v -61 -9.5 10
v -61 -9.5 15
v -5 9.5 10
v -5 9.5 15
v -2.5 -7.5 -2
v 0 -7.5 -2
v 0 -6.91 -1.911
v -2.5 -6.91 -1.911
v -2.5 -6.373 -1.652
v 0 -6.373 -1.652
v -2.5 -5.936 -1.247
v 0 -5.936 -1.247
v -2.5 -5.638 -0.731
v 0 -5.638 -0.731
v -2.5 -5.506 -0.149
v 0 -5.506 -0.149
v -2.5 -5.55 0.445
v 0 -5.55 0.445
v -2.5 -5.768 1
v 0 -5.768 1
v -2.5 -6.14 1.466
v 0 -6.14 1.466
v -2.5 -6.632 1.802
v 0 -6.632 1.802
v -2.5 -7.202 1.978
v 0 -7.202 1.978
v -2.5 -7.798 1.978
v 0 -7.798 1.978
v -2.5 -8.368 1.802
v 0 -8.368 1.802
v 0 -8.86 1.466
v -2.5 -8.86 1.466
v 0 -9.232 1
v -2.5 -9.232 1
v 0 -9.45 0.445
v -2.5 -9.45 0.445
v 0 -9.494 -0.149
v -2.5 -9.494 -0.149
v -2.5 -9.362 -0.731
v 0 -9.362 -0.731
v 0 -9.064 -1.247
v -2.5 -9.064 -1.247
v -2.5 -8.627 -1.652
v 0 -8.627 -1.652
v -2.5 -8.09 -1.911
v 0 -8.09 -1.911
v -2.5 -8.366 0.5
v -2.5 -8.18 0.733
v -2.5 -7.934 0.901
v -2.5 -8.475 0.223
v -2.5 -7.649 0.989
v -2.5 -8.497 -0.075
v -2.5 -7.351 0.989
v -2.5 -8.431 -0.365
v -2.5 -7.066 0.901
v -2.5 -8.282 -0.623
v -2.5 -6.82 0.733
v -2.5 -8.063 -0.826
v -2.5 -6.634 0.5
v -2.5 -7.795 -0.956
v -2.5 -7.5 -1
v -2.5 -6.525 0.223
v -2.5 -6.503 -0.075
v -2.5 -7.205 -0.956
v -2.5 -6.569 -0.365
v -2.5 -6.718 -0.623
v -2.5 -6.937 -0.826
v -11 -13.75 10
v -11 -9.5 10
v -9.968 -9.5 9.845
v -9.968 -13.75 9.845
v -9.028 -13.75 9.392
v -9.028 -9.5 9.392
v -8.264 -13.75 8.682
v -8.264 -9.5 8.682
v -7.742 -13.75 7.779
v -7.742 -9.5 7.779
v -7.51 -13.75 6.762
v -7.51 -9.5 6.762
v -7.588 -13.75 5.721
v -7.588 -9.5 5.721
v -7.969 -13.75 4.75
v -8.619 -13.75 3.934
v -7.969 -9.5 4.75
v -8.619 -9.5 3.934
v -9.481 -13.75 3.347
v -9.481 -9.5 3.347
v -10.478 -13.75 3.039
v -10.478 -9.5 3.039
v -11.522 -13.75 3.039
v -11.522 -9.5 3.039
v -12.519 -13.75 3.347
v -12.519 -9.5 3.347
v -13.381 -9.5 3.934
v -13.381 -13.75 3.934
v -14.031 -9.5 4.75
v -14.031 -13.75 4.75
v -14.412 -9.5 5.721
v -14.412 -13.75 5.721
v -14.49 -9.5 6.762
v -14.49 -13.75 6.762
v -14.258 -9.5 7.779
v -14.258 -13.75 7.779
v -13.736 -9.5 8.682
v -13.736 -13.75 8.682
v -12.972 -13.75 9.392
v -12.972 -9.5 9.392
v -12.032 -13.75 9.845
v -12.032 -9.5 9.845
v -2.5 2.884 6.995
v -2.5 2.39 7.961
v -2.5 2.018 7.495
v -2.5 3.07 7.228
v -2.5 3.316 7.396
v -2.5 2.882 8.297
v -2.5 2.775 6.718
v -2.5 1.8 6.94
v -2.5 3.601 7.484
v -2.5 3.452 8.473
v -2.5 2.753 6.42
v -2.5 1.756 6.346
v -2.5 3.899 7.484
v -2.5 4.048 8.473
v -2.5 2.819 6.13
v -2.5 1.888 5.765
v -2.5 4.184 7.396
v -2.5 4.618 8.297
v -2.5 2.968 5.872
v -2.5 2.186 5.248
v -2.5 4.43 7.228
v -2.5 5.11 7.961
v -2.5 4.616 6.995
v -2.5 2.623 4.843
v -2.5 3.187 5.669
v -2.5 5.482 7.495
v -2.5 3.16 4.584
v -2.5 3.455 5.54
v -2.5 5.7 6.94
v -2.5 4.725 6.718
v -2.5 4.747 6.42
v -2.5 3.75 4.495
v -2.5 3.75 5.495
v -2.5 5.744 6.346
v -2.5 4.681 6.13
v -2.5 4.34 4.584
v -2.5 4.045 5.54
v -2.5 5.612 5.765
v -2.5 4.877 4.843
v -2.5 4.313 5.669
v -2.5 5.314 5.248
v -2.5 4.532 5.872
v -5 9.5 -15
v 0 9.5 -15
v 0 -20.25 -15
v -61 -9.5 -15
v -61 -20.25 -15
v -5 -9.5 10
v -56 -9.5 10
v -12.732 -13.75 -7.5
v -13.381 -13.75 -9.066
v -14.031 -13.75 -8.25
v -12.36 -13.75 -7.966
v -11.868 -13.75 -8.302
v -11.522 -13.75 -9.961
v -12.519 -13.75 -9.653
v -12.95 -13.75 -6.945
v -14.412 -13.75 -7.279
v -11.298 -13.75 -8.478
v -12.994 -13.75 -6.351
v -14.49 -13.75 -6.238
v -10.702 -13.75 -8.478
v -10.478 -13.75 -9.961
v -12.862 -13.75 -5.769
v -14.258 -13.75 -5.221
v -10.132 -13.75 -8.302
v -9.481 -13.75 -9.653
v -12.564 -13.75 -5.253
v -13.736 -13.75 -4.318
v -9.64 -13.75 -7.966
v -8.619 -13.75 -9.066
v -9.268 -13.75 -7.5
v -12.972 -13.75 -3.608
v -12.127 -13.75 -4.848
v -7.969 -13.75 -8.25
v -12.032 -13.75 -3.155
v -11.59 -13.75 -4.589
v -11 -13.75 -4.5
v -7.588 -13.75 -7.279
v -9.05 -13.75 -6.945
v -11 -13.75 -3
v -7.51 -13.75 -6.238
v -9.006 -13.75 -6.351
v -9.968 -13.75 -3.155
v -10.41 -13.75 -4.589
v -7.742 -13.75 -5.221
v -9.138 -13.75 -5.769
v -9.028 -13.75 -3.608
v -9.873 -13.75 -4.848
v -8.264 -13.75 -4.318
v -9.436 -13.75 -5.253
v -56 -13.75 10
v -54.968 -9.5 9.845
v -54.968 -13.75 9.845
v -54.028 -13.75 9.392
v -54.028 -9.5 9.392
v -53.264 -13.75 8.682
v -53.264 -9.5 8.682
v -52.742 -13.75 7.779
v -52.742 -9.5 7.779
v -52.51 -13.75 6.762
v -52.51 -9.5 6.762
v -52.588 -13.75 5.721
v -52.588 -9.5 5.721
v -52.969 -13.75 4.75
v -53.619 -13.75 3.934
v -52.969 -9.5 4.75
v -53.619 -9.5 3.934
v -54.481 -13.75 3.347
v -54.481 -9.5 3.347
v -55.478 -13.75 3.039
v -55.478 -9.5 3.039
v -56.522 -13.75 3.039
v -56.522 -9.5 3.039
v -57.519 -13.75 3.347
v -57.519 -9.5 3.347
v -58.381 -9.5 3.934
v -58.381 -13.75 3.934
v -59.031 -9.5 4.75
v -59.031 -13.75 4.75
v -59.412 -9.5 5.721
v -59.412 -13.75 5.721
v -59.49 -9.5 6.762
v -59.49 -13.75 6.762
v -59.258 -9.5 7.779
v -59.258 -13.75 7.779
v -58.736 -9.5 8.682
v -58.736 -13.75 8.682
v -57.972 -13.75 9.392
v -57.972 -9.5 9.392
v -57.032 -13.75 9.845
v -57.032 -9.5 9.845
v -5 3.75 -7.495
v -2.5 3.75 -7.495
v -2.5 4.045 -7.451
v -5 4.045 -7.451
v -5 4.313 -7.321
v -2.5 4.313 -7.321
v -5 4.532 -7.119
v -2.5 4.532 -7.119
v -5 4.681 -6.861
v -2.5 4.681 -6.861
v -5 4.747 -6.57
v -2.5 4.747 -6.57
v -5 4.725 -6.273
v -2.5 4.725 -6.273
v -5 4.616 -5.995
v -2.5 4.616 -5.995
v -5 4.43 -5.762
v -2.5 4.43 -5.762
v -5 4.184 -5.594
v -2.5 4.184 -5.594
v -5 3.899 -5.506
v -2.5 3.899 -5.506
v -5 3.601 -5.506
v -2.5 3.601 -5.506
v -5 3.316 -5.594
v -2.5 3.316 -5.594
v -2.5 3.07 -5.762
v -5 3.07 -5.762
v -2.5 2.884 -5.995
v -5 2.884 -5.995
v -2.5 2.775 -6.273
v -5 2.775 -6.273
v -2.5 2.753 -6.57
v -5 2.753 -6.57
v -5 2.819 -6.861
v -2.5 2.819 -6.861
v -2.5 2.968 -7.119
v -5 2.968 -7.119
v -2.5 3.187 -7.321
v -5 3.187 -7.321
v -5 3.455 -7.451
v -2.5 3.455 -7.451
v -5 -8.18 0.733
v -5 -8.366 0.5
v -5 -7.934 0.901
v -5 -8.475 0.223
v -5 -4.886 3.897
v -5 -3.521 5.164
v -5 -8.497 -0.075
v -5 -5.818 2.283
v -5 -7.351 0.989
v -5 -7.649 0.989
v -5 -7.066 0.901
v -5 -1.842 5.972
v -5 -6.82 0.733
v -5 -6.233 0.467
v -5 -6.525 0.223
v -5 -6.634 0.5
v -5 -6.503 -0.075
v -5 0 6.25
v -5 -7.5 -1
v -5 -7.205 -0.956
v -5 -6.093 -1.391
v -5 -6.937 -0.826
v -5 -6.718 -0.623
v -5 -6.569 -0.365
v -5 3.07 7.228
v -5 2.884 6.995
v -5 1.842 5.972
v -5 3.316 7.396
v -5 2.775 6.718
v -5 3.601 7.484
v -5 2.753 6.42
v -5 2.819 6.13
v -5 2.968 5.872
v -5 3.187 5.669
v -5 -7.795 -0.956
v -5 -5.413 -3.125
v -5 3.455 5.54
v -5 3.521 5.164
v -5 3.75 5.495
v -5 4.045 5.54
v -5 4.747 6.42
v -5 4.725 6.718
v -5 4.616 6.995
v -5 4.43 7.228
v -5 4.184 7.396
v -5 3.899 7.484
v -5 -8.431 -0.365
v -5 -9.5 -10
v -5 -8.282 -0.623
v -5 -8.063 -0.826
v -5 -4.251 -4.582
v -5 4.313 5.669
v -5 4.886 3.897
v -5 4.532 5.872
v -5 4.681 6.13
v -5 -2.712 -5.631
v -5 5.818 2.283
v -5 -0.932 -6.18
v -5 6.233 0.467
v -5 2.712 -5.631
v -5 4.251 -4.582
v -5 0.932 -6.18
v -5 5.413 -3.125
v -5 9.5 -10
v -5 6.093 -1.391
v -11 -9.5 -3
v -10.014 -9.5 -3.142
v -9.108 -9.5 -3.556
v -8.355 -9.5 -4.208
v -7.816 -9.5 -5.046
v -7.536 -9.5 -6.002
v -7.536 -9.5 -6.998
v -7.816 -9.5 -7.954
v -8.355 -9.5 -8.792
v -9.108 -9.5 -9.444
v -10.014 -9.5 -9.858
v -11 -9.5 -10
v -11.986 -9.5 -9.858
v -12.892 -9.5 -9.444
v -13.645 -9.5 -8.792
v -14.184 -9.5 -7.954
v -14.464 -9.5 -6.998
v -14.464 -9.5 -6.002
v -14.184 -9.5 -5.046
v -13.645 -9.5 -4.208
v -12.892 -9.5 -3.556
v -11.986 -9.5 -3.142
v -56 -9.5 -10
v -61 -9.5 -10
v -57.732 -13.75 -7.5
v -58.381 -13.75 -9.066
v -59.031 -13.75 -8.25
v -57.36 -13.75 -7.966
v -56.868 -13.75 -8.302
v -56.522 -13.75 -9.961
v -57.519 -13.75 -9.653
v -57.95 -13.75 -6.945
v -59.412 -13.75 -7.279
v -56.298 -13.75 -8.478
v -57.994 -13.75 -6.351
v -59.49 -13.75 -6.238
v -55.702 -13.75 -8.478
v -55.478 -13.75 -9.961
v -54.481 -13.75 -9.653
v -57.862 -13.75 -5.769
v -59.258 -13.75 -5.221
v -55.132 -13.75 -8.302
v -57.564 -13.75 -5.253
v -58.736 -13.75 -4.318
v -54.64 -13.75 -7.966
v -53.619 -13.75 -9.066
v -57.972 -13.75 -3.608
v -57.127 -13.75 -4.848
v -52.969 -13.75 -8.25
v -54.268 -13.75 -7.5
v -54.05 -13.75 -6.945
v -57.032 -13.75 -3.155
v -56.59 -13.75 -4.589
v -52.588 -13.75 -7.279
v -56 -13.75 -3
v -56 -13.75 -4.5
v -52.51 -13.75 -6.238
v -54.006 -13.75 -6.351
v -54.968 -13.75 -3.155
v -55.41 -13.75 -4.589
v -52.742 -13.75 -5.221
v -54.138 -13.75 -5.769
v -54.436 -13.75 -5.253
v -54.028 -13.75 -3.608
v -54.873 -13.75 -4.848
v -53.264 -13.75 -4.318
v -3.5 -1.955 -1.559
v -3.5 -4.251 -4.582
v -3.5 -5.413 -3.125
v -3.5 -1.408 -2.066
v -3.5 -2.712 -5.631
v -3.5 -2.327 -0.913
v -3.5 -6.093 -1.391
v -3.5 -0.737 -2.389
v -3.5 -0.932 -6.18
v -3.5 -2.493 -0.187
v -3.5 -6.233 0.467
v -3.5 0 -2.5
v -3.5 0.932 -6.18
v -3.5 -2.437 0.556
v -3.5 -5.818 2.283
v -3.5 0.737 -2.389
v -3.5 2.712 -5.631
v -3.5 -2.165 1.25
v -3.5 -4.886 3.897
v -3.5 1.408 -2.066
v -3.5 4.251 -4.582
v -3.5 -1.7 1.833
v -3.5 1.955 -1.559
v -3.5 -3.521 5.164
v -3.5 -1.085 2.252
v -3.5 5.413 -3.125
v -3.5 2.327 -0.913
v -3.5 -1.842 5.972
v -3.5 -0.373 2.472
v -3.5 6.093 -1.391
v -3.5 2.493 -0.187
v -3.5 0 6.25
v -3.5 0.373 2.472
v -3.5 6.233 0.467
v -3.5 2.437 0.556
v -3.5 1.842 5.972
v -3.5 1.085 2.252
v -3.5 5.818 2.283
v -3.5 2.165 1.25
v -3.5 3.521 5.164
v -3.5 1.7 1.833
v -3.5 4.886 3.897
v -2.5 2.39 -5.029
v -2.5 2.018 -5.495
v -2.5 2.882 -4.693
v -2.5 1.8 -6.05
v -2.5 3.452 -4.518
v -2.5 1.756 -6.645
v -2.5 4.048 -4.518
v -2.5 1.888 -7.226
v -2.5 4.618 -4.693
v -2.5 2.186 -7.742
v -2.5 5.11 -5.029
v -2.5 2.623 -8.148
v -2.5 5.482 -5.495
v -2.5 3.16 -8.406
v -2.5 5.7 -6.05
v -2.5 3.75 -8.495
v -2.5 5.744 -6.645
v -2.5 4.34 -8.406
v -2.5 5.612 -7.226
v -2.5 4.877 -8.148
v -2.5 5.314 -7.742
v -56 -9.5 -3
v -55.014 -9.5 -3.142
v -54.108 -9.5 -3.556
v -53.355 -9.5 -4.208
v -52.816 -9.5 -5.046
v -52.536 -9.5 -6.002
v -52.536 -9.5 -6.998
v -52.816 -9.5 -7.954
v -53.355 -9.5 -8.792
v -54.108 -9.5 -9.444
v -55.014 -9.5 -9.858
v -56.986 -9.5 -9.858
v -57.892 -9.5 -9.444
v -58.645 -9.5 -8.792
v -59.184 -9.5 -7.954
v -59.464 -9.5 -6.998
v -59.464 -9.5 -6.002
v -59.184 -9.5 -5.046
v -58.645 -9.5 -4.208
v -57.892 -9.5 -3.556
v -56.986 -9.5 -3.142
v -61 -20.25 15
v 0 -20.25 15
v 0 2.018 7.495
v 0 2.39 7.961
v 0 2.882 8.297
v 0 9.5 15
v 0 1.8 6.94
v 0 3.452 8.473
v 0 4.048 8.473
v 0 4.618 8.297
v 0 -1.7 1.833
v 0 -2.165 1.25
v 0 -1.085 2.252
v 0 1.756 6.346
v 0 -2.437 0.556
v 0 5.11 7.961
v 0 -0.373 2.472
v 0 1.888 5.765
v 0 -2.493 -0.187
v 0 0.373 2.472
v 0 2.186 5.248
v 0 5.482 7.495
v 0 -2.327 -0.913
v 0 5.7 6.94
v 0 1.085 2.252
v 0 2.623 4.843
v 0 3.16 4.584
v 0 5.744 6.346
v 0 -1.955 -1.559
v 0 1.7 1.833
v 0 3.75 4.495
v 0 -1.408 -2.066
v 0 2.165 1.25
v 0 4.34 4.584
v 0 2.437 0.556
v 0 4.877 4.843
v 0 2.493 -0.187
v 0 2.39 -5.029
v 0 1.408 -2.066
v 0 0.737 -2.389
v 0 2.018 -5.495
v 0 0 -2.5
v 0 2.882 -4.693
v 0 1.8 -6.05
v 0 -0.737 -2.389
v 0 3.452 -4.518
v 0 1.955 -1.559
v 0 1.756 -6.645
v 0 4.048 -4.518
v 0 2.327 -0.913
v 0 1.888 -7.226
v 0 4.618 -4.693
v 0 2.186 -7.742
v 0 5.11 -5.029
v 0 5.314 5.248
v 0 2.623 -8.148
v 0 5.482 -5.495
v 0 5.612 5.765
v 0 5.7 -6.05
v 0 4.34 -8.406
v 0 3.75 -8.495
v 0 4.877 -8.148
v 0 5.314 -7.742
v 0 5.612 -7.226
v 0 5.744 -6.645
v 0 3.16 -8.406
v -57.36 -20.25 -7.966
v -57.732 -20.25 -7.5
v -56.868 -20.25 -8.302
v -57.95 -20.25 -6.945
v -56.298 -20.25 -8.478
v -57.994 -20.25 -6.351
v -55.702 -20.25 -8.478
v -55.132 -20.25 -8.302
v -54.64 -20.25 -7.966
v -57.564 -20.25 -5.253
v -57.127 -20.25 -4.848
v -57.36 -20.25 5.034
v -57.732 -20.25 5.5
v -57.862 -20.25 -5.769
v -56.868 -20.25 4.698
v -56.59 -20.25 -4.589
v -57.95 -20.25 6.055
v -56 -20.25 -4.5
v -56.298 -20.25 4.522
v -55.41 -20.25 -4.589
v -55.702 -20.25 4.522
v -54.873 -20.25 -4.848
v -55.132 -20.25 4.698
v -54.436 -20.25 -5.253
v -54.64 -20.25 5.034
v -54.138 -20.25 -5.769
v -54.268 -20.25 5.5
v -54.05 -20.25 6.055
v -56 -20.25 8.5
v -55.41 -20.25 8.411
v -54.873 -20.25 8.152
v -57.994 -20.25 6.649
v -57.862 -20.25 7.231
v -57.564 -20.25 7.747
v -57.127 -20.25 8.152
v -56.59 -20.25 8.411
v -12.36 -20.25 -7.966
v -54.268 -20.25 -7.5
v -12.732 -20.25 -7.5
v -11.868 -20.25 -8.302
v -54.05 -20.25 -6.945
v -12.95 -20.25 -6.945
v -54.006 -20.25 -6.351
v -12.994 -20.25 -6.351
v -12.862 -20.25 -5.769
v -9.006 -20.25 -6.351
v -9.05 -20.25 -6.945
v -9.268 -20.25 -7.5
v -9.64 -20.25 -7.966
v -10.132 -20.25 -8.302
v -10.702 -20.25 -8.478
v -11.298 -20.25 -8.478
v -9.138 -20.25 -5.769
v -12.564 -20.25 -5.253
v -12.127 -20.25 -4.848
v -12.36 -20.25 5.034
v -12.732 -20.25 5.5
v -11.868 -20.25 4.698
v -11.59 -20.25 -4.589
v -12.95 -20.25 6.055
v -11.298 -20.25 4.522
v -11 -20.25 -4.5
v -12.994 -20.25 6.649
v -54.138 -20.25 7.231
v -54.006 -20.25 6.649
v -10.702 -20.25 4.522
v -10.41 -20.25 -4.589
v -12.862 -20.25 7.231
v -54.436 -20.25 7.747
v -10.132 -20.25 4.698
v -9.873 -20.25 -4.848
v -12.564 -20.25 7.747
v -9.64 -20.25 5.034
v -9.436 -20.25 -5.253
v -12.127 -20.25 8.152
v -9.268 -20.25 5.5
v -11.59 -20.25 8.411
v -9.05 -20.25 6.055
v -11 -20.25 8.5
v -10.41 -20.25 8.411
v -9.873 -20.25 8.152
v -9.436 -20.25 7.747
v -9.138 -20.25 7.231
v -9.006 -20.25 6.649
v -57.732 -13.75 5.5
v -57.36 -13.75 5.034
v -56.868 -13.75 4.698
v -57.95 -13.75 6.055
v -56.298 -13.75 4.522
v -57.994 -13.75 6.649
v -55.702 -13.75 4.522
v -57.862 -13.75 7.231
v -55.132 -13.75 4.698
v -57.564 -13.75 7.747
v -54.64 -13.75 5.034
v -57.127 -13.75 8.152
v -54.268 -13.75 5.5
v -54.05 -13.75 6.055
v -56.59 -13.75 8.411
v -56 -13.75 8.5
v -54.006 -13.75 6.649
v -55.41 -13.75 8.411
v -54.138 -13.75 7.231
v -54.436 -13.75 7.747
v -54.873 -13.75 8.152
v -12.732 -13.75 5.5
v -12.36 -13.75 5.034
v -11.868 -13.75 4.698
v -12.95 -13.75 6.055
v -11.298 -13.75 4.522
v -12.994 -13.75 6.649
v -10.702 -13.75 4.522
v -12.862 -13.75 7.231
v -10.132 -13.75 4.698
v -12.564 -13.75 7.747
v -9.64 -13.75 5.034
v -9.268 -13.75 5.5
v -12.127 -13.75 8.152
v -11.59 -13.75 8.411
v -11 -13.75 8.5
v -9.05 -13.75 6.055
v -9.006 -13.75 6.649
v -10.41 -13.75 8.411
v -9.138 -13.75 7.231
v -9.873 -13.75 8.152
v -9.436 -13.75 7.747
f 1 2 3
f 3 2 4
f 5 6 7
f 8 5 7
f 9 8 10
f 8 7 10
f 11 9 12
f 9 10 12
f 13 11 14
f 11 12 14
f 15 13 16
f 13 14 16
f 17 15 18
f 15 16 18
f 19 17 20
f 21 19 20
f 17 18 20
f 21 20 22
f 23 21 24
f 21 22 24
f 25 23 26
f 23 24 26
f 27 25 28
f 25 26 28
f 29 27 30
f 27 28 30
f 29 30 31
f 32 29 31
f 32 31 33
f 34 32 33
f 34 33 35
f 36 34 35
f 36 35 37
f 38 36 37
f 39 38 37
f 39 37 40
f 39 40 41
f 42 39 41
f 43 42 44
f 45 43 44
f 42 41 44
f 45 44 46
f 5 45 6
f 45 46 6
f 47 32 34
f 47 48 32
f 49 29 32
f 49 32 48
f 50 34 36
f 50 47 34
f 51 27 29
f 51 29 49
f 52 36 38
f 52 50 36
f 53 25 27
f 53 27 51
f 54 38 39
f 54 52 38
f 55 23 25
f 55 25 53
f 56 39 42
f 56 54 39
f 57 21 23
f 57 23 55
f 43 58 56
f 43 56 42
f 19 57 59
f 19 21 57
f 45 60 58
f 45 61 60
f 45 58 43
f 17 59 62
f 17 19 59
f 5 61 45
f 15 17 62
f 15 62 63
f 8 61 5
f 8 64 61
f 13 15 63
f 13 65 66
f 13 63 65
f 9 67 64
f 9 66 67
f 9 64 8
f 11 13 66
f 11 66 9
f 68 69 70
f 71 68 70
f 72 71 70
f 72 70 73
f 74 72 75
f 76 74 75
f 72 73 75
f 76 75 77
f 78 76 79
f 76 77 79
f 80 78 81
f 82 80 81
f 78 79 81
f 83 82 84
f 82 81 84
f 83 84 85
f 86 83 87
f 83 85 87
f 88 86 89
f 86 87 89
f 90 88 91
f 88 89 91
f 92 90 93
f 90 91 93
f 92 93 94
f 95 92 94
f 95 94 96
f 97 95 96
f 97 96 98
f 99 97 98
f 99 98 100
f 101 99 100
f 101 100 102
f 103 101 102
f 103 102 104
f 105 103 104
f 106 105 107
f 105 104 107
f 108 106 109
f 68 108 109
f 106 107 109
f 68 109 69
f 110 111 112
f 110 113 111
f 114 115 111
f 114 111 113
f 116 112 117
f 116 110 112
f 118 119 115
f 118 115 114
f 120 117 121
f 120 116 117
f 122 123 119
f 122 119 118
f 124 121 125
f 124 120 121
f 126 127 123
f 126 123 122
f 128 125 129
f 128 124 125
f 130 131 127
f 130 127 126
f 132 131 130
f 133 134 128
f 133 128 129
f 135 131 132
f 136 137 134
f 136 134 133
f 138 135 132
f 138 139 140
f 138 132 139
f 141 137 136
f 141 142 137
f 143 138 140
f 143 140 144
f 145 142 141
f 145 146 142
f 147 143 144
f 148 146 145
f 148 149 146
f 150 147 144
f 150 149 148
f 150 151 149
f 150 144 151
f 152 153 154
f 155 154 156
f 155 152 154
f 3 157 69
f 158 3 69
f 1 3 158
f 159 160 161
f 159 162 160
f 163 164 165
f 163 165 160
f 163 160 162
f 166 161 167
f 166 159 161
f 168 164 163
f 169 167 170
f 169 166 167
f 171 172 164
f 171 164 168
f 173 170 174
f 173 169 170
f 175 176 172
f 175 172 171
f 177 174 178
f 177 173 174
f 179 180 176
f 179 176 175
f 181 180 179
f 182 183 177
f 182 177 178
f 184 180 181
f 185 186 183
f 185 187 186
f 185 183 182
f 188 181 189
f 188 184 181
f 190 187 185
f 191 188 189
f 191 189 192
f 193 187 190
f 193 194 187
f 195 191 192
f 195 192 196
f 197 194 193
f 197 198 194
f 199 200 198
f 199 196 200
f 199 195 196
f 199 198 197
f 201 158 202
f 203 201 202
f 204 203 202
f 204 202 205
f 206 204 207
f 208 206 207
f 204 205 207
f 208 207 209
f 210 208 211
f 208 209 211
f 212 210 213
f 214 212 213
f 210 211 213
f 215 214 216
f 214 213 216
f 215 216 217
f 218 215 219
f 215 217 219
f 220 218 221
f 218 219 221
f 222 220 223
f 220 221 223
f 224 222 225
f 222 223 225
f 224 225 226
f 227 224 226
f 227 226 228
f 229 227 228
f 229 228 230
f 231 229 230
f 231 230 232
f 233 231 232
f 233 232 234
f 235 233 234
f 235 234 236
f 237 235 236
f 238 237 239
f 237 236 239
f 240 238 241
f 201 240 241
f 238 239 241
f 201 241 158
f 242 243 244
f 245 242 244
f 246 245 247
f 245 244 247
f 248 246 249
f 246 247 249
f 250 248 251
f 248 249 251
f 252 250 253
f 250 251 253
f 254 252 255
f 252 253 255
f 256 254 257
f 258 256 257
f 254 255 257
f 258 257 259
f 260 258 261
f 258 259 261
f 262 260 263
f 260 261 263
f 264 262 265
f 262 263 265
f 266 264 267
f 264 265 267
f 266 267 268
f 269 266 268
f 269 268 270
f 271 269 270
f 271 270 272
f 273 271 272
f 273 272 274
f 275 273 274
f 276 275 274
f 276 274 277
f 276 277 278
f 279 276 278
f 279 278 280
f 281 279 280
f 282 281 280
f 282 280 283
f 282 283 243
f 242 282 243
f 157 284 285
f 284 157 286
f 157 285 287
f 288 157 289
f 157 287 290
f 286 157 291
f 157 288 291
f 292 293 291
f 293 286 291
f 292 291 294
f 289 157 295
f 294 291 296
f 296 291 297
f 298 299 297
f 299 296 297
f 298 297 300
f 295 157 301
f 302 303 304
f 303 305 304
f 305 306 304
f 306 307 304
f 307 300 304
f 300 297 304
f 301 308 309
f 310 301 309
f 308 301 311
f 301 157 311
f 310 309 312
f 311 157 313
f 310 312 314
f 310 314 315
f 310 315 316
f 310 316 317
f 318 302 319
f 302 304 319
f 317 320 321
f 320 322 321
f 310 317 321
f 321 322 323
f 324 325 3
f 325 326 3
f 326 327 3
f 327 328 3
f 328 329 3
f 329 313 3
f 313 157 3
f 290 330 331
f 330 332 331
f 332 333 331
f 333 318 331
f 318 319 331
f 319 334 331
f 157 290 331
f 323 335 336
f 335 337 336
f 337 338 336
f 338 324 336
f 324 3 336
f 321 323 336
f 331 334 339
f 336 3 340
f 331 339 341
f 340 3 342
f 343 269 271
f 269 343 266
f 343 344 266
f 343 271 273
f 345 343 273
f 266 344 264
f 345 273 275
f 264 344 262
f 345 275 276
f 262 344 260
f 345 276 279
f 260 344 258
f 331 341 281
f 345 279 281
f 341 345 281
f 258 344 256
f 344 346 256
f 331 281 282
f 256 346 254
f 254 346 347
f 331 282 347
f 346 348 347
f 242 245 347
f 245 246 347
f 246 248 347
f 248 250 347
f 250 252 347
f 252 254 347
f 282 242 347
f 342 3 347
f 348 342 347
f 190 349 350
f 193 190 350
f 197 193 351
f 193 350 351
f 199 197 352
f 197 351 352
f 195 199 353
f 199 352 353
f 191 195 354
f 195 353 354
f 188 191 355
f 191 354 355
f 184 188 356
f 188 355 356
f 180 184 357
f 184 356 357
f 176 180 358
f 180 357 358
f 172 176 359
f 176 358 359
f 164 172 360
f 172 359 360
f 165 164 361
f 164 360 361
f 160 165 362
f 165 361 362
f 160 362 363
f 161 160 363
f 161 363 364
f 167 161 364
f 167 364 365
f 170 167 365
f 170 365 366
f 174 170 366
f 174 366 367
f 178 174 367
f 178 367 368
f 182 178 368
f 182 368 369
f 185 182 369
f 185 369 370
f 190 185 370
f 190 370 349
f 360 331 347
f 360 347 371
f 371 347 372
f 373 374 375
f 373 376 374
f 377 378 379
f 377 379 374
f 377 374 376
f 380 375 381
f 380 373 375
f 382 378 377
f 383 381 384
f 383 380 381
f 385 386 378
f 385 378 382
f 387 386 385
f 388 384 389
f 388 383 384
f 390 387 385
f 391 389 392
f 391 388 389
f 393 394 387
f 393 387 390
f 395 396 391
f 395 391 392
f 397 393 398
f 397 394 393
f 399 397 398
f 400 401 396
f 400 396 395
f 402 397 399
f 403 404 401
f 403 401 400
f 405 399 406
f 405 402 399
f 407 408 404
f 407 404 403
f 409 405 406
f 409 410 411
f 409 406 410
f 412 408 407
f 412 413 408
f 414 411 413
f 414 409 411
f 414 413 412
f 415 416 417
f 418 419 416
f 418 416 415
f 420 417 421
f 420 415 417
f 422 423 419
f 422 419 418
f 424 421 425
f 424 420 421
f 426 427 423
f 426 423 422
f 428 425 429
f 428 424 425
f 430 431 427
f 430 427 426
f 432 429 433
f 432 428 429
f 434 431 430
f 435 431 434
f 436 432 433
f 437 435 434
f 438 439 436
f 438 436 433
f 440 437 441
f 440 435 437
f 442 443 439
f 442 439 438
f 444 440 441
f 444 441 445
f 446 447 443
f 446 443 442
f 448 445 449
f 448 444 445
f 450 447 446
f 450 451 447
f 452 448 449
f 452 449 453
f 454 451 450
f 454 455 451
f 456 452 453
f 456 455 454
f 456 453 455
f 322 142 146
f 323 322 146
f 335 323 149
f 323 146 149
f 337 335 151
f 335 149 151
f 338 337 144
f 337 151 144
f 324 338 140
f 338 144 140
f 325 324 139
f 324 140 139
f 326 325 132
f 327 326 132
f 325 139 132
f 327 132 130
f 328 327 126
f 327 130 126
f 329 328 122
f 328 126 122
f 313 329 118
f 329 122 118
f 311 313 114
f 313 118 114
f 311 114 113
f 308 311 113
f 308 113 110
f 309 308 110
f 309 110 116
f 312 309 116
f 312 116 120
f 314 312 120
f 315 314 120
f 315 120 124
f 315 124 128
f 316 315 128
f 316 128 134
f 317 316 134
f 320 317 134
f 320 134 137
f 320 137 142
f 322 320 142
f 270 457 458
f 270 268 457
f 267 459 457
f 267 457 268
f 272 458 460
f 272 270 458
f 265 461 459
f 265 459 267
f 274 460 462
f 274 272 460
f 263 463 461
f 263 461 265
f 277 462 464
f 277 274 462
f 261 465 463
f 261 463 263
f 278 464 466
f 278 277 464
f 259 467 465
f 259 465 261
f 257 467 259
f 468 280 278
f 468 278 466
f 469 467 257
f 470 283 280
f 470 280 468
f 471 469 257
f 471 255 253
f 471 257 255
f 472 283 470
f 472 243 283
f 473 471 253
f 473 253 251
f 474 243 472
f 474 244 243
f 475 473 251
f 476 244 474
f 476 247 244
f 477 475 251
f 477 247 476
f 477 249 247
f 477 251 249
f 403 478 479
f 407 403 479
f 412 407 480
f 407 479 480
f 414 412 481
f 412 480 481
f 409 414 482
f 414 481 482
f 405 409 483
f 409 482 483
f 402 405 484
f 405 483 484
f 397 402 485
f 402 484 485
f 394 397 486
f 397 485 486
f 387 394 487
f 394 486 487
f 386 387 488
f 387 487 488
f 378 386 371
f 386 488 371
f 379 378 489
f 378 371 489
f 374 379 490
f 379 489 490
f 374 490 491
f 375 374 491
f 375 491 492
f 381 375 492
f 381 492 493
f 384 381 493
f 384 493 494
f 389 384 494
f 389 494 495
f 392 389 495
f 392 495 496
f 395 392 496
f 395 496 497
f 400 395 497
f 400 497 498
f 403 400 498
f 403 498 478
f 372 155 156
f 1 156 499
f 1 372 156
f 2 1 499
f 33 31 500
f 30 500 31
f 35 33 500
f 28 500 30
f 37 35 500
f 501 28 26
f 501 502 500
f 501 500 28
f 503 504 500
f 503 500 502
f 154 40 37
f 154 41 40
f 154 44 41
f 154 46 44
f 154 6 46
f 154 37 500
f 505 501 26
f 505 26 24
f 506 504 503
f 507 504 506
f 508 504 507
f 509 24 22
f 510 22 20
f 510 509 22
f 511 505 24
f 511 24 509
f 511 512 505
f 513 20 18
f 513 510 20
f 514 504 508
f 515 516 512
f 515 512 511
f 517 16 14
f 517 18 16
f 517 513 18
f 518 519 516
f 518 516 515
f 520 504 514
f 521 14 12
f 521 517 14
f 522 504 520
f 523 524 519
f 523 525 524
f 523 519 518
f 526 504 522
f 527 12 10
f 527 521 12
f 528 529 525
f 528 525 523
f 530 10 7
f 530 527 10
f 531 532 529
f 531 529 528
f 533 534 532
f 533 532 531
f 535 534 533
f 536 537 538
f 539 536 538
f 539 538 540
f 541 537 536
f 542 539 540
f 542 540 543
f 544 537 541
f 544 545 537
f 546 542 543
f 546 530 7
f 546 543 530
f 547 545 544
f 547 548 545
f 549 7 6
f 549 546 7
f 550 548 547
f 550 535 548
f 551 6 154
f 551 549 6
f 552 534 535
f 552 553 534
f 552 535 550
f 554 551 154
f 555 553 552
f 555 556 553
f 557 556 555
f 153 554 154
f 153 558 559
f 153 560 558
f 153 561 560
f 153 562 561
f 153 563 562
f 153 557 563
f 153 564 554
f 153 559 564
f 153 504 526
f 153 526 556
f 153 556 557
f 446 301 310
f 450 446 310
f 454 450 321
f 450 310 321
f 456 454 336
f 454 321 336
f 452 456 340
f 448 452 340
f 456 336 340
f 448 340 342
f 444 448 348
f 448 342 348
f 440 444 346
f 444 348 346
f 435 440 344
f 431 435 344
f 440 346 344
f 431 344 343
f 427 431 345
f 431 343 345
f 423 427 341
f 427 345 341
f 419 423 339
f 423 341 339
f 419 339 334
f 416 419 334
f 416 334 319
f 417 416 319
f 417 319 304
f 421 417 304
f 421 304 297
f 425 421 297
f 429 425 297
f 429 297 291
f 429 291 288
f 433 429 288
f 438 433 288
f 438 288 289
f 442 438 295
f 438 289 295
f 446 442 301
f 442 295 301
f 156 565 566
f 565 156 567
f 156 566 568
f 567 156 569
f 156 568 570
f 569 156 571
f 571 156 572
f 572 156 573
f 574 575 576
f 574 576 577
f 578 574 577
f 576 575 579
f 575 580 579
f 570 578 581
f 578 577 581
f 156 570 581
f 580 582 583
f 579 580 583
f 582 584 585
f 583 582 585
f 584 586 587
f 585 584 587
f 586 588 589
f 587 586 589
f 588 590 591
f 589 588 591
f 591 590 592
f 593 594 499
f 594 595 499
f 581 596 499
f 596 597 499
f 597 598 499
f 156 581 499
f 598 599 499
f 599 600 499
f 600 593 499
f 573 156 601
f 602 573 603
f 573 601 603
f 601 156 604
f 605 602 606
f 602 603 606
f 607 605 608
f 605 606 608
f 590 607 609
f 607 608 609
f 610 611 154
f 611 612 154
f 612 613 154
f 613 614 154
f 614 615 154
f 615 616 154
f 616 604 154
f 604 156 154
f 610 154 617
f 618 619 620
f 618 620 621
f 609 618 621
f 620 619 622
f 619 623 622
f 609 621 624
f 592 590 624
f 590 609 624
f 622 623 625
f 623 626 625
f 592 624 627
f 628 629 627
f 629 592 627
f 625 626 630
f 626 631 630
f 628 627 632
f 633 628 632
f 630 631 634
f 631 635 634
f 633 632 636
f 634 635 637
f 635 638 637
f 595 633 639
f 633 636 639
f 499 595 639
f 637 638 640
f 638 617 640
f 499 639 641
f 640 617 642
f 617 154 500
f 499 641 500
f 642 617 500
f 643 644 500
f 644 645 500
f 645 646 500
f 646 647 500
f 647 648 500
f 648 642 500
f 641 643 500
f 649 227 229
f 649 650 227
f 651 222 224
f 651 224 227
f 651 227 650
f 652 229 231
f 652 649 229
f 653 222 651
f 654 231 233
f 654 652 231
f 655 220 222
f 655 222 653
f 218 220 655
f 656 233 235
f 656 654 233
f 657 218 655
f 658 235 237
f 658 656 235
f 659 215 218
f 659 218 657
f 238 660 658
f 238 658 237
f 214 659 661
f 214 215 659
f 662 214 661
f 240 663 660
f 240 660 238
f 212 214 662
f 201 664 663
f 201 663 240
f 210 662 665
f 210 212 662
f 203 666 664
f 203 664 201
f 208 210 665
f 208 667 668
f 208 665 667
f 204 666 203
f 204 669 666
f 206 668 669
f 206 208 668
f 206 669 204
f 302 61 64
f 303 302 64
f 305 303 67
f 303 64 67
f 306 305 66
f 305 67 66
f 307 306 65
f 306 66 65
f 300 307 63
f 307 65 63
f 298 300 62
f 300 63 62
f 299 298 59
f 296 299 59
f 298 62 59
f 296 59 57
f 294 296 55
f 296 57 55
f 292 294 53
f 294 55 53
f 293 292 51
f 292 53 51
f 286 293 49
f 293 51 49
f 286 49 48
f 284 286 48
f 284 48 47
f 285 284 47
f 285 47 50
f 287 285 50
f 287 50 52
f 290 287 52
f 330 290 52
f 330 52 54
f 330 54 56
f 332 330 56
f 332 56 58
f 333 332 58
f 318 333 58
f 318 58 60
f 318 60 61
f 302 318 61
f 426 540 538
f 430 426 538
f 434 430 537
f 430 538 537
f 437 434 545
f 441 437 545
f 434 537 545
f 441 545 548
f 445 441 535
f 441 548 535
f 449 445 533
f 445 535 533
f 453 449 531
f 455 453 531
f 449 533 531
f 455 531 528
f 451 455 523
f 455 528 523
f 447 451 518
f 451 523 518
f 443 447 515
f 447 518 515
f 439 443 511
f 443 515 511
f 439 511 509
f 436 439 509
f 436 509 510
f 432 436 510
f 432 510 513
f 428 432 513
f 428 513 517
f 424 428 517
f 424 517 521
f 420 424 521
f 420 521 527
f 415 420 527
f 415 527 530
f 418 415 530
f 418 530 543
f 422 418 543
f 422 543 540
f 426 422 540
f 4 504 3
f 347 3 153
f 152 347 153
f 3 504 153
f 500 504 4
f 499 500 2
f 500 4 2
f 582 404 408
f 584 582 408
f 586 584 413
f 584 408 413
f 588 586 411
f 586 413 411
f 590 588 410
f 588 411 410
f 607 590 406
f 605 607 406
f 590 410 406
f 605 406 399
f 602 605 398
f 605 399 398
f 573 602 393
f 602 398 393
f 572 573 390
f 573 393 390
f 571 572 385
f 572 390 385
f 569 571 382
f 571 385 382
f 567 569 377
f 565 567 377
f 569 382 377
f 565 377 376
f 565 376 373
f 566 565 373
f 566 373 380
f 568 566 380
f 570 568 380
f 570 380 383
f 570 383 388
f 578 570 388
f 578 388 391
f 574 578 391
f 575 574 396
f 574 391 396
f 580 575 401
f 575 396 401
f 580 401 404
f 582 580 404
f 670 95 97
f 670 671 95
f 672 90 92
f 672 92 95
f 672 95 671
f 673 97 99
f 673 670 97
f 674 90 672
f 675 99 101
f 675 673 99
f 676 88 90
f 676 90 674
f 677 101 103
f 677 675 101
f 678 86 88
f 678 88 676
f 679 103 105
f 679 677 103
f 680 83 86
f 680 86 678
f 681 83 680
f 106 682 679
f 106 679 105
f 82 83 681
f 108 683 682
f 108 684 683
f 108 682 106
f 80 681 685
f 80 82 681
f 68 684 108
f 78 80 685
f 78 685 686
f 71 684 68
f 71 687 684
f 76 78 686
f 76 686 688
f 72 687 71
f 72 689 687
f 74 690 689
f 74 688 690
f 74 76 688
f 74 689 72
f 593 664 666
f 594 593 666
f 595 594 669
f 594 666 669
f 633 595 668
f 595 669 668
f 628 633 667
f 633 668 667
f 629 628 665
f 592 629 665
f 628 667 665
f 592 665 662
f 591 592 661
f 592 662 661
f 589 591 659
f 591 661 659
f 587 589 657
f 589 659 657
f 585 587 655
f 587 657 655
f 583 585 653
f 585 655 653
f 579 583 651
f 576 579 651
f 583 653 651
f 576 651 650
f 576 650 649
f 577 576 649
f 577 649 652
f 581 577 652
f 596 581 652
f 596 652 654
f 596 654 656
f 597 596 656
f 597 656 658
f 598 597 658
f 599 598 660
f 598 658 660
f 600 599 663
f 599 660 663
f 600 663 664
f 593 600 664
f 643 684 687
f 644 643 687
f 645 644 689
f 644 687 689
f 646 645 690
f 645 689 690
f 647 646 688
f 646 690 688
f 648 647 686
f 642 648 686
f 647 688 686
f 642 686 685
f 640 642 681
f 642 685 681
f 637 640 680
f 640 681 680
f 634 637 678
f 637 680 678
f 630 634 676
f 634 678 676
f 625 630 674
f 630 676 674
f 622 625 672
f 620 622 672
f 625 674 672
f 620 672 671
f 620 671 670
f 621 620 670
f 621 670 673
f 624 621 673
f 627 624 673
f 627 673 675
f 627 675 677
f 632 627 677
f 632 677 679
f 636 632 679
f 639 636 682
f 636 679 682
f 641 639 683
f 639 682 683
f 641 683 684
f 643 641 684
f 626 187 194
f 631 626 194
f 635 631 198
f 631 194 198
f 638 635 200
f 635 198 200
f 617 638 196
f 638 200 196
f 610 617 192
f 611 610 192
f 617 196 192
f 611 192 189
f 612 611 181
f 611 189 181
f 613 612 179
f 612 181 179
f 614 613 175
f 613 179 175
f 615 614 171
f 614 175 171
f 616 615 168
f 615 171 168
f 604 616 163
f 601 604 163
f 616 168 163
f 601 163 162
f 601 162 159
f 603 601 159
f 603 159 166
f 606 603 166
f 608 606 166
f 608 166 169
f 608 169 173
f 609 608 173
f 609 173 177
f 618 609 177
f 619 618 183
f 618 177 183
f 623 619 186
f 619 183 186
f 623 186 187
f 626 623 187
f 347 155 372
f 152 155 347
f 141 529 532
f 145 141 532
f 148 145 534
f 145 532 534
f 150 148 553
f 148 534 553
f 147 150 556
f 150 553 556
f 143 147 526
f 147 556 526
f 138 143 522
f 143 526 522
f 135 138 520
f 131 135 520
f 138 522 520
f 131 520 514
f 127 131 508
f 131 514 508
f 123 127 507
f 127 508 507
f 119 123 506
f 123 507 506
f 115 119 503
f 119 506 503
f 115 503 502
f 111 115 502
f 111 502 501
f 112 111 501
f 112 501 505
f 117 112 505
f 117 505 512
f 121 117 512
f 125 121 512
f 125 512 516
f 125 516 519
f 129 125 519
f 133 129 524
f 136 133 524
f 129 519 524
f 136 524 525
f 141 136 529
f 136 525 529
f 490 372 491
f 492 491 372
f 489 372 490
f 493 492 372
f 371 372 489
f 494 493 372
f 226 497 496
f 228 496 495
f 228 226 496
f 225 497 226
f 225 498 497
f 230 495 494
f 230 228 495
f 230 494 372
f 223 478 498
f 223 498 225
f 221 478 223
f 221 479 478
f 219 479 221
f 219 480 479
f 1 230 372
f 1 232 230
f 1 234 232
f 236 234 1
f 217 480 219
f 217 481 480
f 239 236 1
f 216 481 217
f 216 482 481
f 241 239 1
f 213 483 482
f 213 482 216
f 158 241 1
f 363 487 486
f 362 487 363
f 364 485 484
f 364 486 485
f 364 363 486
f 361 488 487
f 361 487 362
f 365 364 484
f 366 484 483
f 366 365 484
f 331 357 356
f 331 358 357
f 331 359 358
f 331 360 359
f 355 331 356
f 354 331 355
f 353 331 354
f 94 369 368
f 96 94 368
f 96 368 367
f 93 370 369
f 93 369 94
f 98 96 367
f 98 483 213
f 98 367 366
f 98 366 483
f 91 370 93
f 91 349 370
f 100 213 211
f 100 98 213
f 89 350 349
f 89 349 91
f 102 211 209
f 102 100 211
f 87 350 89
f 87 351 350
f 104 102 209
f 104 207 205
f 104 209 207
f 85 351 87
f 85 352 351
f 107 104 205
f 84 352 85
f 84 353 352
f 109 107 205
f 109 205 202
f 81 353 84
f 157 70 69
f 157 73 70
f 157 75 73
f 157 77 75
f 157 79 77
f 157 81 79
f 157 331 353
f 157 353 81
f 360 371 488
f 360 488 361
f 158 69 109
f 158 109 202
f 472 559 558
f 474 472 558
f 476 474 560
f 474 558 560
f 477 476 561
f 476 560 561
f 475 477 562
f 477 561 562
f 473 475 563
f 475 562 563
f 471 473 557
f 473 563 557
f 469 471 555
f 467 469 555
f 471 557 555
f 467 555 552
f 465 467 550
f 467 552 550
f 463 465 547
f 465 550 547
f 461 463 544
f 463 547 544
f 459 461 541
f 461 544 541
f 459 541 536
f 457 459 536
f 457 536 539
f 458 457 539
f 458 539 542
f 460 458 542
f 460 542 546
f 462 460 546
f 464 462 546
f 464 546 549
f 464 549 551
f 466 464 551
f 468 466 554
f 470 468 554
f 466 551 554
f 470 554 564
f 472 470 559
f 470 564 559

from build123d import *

# Parameters (mm, degrees)
SKETCH5_W           = 30
SKETCH5_H           = 29.75
SKETCH5_R           = 2.5
SKETCH5_R_2         = 1
BOSS_EXTRUDE3_DEPTH = 5
SKETCH10_R          = 2
CUT_EXTRUDE8_DEPTH  = 2.5
SKETCH11_W          = 30
SKETCH11_H          = 10.75
BOSS_EXTRUDE4_DEPTH = 56
BOSS_EXTRUDE5_DEPTH = 5
SKETCH13_R          = 6.25
CUT_EXTRUDE9_DEPTH  = 1.5
SKETCH16_R          = 3.5
CUT_EXTRUDE10_DEPTH = 4.25
SKETCH17_R          = 2
CUT_EXTRUDE11_DEPTH = 6.5


with BuildPart() as part:
    # Sketch5 → Boss-Extrude3 (new body)
    with BuildSketch(Plane(origin=(0, 0, 0), x_dir=(0, 0, -1), z_dir=(1, 0, 0))):
        with Locations((0, -5.375)):
            Rectangle(SKETCH5_W, SKETCH5_H)
        Circle(SKETCH5_R, mode=Mode.SUBTRACT)
        with Locations((6.495190528, 3.75)):
            Circle(SKETCH5_R_2, mode=Mode.SUBTRACT)
        with Locations((0, -7.5)):
            Circle(SKETCH5_R_2, mode=Mode.SUBTRACT)
        with Locations((-6.495190528, 3.75)):
            Circle(SKETCH5_R_2, mode=Mode.SUBTRACT)
    extrude(amount=-BOSS_EXTRUDE3_DEPTH)

    # Sketch10 → Cut-Extrude8 (cut)
    with BuildSketch(Plane(origin=(0, 0, 0), x_dir=(0, 0, -1), z_dir=(1, 0, 0))):
        with Locations((-6.495190528, 3.75)):
            Circle(SKETCH10_R)
        with Locations((6.495190528, 3.75)):
            Circle(SKETCH10_R)
        with Locations((0, -7.5)):
            Circle(SKETCH10_R)
    extrude(amount=-CUT_EXTRUDE8_DEPTH, mode=Mode.SUBTRACT)

    # Sketch11 → Boss-Extrude4 (add)
    with BuildSketch(Plane.ZY.offset(5)):
        with Locations((0, -14.875)):
            Rectangle(SKETCH11_W, SKETCH11_H)
    extrude(amount=BOSS_EXTRUDE4_DEPTH)

    # Sketch12 → Boss-Extrude5 (add)
    with BuildSketch(Plane(origin=(0, 0, -15), x_dir=(-1, 0, 0), z_dir=(0, 0, -1))):
        Polygon((5, -9.5), (61, -9.5), (5, 9.5), align=None)
    boss_extrude5 = extrude(amount=-BOSS_EXTRUDE5_DEPTH)

    # Mirror1: Boss-Extrude5 across plane
    add(boss_extrude5.mirror(Plane.XY))

    # Sketch13 → Cut-Extrude9 (cut)
    with BuildSketch(Plane.ZY.offset(5)):
        Circle(SKETCH13_R)
    extrude(amount=-CUT_EXTRUDE9_DEPTH, mode=Mode.SUBTRACT)

    # Sketch16 → Cut-Extrude10 (cut)
    with BuildSketch(Plane(origin=(0, -9.5, 0), x_dir=(1, 0, 0), z_dir=(0, 1, 0))):
        with Locations(Location((-11, 6.5, 0), (0, 0, 270))):
            Circle(SKETCH16_R)
        with Locations(Location((-56, 6.5, 0), (0, 0, 270))):
            Circle(SKETCH16_R)
        with Locations(Location((-56, -6.5, 0), (0, 0, 270))):
            Circle(SKETCH16_R)
        with Locations(Location((-11, -6.5, 0), (0, 0, 270))):
            Circle(SKETCH16_R)
    extrude(amount=-CUT_EXTRUDE10_DEPTH, mode=Mode.SUBTRACT)

    # Sketch17 → Cut-Extrude11 (cut)
    with BuildSketch(Plane(origin=(0, -13.75, 0), x_dir=(1, 0, 0), z_dir=(0, 1, 0))):
        with Locations(Location((-56, 6.5, 0), (0, 0, 270))):
            Circle(SKETCH17_R)
        with Locations(Location((-11, 6.5, 0), (0, 0, 270))):
            Circle(SKETCH17_R)
        with Locations(Location((-11, -6.5, 0), (0, 0, 270))):
            Circle(SKETCH17_R)
        with Locations(Location((-56, -6.5, 0), (0, 0, 270))):
            Circle(SKETCH17_R)
    extrude(amount=-CUT_EXTRUDE11_DEPTH, mode=Mode.SUBTRACT)


solid = part.part
